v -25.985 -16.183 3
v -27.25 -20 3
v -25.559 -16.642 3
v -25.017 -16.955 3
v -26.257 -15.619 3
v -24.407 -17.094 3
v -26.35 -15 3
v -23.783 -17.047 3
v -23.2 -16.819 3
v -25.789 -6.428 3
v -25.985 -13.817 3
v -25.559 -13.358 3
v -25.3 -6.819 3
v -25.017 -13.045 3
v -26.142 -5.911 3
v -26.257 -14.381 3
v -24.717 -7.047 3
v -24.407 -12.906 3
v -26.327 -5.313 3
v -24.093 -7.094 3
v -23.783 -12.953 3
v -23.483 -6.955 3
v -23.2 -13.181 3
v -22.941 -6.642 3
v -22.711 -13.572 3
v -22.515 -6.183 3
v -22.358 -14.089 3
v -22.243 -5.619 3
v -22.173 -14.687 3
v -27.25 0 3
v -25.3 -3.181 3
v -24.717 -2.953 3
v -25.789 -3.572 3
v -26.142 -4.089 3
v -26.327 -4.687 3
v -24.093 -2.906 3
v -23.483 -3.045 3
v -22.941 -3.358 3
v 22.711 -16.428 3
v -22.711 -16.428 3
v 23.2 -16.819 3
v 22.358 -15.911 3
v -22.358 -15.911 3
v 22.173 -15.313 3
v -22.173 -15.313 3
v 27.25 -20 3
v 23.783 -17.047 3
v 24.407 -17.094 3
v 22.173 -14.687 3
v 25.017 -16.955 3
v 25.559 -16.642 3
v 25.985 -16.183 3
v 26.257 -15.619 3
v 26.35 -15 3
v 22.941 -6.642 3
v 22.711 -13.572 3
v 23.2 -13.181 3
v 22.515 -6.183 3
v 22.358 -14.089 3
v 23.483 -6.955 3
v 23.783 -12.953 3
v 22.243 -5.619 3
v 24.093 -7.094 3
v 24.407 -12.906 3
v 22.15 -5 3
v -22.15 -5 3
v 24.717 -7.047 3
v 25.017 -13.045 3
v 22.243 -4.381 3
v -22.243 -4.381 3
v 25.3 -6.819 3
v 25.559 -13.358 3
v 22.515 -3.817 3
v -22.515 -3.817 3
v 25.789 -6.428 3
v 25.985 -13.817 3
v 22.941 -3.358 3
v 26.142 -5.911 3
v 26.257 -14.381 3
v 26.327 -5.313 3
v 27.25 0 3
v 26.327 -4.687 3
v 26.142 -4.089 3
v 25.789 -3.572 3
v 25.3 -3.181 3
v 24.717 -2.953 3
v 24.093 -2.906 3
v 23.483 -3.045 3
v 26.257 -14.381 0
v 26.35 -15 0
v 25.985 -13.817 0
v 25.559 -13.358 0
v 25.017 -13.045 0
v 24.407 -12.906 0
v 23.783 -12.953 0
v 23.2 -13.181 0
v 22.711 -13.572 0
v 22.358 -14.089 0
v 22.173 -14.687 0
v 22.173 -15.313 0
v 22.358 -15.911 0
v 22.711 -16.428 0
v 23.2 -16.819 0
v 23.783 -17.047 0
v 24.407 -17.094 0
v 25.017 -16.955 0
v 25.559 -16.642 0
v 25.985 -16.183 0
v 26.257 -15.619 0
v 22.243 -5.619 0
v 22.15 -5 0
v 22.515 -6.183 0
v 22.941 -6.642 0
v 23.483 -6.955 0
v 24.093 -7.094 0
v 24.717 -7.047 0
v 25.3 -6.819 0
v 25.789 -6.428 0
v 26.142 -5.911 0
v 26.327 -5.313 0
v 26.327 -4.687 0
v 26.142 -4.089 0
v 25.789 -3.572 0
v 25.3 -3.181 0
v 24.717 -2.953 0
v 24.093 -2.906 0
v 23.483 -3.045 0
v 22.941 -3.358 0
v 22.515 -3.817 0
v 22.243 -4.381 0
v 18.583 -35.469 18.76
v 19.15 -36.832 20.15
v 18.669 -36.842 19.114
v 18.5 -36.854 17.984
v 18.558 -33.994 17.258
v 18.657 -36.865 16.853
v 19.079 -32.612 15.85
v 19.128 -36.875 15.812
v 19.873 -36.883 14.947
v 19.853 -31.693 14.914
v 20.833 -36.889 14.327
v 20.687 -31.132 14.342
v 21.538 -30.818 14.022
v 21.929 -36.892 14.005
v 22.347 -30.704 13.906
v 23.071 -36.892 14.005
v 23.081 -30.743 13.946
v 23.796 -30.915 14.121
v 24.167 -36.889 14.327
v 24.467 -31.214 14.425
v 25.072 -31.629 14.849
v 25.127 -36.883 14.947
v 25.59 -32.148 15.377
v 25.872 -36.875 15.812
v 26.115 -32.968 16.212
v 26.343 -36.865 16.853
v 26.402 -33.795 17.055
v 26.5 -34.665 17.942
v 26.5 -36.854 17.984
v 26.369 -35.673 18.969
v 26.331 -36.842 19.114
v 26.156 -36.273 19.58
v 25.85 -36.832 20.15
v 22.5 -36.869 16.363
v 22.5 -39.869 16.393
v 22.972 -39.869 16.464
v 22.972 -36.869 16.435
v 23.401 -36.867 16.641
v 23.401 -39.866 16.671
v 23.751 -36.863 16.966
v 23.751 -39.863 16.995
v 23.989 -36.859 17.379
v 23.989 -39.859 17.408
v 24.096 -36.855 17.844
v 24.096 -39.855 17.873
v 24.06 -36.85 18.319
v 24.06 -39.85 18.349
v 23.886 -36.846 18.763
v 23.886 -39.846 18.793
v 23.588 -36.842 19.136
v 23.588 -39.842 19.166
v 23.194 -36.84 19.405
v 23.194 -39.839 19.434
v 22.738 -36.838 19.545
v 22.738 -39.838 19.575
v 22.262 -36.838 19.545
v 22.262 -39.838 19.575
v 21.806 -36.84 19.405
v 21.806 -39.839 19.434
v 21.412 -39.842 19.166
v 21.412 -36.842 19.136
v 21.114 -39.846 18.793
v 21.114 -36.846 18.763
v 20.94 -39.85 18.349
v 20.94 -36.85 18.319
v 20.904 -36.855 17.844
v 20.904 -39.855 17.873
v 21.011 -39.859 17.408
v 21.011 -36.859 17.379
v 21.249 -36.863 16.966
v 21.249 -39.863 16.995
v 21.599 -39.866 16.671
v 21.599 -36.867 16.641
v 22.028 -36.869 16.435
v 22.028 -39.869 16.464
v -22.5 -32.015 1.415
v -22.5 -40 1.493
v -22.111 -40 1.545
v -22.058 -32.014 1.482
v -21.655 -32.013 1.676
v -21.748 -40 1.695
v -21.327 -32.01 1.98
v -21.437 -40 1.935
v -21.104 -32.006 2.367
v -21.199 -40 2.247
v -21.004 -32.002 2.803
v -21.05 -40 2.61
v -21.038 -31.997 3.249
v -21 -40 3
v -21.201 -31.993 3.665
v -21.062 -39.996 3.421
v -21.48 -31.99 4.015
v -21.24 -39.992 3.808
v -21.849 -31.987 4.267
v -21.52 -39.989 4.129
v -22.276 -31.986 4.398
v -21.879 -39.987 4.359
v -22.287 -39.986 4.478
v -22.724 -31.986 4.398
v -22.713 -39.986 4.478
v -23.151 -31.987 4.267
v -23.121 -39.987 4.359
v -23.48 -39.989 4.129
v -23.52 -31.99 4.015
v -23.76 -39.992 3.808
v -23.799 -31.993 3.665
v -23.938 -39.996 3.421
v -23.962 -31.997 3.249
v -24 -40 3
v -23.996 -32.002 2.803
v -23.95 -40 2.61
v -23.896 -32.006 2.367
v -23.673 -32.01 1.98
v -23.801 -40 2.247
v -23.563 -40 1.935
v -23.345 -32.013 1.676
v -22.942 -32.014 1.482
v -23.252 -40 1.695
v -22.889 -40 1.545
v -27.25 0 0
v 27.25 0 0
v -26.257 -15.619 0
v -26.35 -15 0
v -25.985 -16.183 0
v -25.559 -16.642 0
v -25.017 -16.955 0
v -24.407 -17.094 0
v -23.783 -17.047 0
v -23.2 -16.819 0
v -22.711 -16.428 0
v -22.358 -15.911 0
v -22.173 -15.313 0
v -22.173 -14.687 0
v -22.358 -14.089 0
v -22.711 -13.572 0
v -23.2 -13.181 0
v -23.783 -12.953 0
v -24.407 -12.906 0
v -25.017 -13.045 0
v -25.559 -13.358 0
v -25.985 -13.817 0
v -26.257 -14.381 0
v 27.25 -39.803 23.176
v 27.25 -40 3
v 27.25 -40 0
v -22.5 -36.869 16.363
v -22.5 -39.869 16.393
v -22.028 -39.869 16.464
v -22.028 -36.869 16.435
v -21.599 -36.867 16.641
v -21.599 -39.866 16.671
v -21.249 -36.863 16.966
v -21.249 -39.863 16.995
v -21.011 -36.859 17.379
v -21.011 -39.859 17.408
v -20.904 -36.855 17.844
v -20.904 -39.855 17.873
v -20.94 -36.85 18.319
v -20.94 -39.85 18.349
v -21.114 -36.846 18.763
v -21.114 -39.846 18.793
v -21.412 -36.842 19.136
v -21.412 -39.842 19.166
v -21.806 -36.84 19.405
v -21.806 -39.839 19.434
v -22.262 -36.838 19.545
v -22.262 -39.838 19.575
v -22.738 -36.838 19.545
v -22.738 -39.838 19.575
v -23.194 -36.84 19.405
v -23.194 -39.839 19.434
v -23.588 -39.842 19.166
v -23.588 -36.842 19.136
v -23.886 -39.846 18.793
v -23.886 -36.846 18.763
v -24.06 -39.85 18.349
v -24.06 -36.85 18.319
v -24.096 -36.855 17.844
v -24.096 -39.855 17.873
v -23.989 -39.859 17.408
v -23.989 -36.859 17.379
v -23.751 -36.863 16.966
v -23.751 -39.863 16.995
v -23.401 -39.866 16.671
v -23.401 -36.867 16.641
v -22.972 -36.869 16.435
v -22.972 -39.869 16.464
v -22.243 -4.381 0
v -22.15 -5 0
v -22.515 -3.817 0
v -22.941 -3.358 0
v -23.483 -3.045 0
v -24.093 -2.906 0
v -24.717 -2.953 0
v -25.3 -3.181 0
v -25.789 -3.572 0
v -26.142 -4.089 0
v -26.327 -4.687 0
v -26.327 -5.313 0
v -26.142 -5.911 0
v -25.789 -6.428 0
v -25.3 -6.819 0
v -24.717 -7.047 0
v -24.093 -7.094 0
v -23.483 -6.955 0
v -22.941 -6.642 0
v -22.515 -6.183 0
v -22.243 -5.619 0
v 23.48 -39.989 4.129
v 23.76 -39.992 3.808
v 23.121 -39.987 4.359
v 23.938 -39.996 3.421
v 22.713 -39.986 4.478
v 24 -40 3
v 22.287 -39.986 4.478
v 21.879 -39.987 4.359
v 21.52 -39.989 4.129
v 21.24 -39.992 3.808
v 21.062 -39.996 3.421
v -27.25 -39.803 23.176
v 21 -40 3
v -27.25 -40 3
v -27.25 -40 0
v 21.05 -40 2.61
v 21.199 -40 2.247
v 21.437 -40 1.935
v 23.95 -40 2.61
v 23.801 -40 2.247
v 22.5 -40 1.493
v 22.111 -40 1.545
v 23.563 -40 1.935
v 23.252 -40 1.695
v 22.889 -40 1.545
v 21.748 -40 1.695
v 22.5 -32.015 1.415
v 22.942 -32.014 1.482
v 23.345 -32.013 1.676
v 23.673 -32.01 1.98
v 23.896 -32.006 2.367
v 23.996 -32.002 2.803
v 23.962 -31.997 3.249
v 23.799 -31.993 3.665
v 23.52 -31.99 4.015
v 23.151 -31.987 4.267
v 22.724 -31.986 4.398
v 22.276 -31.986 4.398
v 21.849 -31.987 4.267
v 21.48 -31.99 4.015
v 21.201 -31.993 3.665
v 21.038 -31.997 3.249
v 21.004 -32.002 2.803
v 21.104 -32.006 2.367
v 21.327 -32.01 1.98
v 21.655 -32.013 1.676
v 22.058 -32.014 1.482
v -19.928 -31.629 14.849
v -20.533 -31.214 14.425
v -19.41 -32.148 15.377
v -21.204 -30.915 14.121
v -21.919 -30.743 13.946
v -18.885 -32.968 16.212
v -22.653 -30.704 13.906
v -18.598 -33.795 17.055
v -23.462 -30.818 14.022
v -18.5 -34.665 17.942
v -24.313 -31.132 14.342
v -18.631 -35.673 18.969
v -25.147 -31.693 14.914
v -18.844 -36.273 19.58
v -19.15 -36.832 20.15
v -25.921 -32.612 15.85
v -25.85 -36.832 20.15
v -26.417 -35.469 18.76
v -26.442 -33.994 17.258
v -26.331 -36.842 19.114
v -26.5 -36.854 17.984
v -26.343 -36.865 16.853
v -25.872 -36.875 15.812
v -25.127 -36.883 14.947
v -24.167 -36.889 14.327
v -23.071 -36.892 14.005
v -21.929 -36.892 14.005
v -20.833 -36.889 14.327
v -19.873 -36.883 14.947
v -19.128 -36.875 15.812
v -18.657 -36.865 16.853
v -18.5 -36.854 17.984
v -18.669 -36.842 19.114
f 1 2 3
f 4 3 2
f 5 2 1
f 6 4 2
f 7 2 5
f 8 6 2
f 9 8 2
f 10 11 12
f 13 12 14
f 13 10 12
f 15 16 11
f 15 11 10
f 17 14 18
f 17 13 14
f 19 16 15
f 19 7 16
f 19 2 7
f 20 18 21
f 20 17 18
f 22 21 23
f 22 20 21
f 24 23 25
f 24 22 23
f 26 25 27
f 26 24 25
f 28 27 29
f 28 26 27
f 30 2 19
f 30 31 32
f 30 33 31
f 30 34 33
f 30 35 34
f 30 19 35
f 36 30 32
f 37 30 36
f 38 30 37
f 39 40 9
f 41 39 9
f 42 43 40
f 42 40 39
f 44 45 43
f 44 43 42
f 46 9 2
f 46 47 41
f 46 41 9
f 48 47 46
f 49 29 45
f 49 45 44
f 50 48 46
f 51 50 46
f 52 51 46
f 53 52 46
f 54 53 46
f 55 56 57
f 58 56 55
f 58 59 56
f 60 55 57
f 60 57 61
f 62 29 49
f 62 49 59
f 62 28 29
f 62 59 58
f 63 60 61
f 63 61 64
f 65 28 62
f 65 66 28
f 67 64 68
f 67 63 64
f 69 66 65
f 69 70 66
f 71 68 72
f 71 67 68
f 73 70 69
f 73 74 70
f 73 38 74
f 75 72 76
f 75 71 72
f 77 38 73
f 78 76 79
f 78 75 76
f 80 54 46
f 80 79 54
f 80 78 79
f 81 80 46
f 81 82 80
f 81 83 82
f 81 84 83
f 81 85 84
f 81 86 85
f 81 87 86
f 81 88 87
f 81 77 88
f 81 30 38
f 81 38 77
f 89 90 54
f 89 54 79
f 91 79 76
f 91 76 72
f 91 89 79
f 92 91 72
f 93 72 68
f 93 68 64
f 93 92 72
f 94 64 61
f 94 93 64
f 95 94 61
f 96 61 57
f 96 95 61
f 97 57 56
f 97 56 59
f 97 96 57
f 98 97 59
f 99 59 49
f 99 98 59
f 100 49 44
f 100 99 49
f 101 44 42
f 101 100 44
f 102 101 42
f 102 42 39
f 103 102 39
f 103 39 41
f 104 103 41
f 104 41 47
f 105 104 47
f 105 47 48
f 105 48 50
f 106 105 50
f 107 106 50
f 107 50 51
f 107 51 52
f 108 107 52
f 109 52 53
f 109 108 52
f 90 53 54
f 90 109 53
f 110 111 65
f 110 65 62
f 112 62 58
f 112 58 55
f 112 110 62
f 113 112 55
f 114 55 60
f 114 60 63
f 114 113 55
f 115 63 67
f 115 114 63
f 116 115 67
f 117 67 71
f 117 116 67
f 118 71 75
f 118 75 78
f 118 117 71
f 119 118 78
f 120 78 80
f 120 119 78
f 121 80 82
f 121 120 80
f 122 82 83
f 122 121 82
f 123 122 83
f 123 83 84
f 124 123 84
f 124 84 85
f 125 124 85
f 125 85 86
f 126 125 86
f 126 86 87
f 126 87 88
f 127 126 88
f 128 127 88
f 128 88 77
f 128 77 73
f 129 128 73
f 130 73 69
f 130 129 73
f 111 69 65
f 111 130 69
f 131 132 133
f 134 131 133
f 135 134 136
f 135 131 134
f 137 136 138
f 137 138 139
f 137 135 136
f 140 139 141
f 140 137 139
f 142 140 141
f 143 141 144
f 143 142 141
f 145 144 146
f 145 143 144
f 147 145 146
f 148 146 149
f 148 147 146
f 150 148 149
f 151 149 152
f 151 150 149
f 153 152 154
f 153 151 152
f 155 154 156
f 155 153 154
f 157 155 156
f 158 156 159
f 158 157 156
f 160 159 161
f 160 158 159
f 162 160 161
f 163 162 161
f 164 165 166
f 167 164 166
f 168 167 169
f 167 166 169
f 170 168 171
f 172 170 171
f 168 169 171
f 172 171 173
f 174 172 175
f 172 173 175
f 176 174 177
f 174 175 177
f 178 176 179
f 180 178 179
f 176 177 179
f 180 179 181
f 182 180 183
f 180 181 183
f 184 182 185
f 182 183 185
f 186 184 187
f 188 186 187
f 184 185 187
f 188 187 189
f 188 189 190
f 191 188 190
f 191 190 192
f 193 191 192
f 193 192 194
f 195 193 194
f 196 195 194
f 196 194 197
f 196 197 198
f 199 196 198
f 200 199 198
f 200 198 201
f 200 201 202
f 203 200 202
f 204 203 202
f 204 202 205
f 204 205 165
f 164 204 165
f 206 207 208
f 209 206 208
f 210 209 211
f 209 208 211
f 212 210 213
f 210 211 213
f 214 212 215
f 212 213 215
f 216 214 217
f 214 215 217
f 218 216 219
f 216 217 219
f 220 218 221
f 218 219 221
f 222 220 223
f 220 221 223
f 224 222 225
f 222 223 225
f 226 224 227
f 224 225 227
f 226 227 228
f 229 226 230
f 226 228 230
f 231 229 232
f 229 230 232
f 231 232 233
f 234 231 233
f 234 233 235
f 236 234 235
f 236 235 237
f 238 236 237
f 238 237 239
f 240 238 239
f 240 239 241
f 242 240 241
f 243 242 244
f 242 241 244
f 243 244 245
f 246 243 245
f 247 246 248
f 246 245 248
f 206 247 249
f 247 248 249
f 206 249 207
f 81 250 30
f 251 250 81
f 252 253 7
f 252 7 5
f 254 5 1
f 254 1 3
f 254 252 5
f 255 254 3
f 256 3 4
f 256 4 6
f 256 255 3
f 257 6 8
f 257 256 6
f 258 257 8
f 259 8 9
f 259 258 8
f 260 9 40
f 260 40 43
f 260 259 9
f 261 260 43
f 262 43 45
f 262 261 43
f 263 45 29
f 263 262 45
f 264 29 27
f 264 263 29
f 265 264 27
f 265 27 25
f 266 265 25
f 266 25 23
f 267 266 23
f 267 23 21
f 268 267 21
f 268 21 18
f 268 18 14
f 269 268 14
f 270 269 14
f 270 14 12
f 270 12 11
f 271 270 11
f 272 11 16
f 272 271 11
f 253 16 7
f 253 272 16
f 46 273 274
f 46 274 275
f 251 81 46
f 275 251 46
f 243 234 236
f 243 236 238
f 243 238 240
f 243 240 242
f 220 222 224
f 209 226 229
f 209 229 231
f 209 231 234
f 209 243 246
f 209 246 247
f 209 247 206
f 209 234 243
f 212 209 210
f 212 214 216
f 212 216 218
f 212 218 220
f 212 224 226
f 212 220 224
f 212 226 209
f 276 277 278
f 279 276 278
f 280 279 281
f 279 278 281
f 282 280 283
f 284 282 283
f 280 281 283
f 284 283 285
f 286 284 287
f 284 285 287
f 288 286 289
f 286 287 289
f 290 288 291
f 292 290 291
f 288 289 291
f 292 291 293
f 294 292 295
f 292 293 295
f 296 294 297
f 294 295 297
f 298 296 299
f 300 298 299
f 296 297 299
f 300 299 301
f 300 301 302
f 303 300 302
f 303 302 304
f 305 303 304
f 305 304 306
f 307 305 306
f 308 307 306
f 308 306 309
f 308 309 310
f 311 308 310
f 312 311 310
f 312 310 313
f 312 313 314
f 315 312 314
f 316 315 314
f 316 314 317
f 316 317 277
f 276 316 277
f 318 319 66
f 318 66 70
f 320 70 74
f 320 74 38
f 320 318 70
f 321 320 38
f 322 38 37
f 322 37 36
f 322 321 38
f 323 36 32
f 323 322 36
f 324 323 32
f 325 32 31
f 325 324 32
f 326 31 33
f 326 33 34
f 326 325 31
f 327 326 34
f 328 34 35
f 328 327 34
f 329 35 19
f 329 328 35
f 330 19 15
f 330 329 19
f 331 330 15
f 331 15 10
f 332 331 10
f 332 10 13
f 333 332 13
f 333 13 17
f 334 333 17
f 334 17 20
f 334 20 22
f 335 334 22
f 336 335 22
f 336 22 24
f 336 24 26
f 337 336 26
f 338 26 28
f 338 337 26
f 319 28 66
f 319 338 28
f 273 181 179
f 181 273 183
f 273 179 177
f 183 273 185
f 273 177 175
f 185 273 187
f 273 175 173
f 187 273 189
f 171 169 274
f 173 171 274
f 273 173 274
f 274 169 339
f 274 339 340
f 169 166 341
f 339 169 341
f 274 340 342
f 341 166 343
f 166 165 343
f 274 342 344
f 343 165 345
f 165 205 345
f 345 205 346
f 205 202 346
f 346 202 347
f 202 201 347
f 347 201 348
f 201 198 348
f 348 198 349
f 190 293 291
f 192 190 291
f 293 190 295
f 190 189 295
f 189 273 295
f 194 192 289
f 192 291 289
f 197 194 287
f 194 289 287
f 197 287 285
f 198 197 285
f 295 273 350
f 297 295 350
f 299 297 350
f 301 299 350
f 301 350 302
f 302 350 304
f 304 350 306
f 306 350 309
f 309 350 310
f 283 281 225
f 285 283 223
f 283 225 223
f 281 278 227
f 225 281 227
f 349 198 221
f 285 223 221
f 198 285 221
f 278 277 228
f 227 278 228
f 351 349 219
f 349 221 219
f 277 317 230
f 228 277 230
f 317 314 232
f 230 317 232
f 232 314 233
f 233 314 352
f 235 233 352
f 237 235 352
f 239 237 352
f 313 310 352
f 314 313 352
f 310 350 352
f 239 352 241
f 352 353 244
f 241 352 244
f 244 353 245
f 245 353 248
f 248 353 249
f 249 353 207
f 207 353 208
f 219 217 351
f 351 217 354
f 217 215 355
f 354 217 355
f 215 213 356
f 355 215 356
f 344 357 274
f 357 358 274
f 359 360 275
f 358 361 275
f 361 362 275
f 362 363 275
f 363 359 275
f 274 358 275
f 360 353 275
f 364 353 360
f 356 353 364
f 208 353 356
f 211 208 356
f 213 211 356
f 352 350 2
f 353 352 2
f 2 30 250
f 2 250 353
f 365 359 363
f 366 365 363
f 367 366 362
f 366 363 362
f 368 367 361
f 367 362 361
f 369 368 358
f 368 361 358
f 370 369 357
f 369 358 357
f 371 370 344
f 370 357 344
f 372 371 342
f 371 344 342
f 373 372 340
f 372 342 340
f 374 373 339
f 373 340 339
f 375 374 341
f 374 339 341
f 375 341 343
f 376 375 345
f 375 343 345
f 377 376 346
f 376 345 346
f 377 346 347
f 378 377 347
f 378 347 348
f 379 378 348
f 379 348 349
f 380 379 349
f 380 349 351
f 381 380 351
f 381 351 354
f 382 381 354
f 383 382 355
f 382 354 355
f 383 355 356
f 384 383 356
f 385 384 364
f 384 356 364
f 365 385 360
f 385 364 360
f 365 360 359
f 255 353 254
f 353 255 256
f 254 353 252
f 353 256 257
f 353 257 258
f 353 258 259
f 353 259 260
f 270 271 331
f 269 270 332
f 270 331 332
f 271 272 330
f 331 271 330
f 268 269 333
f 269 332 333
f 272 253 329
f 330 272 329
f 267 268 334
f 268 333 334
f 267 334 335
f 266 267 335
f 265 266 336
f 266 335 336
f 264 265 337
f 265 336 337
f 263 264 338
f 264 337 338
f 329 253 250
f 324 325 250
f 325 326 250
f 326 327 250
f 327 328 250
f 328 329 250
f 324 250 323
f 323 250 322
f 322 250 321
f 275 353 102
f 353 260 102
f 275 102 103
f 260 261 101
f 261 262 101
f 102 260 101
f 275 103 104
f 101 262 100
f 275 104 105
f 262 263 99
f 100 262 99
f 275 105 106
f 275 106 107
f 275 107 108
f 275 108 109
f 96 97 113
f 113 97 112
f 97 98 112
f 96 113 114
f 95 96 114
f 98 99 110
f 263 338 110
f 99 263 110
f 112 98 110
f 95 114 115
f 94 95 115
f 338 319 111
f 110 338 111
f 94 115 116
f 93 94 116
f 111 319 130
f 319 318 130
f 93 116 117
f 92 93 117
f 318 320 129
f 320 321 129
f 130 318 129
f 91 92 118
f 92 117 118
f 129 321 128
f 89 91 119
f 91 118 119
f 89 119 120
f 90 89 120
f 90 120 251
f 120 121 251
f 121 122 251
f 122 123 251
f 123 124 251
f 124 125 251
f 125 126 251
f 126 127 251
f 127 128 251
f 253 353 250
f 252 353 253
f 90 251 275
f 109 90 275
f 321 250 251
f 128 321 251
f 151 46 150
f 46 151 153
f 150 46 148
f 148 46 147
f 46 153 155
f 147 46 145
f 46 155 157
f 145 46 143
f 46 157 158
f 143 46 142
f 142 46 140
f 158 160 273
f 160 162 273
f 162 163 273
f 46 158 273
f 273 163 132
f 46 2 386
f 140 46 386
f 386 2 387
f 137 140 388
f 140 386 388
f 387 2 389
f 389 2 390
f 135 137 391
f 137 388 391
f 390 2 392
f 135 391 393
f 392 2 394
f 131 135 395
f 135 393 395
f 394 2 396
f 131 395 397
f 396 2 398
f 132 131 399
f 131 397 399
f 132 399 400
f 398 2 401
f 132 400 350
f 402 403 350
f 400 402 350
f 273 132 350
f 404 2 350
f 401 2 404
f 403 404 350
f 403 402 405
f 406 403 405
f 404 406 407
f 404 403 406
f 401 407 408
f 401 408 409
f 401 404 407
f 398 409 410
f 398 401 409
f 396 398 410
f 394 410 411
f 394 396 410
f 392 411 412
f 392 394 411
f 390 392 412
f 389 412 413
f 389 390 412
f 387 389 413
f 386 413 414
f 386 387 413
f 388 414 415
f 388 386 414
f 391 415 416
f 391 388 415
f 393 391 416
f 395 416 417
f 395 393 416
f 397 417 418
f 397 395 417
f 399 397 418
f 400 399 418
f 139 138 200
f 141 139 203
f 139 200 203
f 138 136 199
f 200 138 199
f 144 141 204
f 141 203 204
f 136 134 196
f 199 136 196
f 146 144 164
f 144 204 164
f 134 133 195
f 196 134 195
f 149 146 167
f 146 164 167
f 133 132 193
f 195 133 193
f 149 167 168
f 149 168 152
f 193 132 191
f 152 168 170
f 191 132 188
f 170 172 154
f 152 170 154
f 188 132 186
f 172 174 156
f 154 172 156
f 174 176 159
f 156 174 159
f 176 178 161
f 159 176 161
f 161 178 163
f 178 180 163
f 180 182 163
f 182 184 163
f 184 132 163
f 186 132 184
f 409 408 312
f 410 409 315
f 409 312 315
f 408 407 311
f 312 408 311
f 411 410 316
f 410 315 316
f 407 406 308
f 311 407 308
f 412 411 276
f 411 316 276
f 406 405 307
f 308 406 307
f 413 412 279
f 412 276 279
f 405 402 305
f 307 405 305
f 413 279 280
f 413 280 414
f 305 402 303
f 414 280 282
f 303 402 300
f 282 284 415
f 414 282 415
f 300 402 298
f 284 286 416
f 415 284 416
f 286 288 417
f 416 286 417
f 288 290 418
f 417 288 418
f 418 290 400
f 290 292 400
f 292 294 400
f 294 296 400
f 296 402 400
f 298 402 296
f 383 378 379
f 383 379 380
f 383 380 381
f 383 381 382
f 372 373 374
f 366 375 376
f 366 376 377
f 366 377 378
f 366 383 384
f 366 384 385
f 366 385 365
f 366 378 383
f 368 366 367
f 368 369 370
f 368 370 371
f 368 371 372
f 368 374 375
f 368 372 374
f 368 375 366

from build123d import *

# Parameters (mm, degrees)
SKETCH_1_W          = 54.5
SKETCH_1_H          = 40
SKETCH_1_R          = 2.1
EXTRUDE_1_DEPTH     = 3
EXTRUDE_2_DEPTH     = 54.5
SKETCH_3_R          = 1.5
SKETCH_3_R_2        = 1.6
CUT_EXTRUDE_1_DEPTH = 8
CUT_EXTRUDE_START   = -10
SKETCH_4_R          = 4
CUT_EXTRUDE_2_DEPTH = 7


with BuildPart() as part:
    # 草图1 → 凸台-拉伸1 (new body)
    with BuildSketch(Plane.XY):
        with Locations((0, -20)):
            Rectangle(SKETCH_1_W, SKETCH_1_H)
        with Locations((-24.25, -5)):
            Circle(SKETCH_1_R, mode=Mode.SUBTRACT)
        with Locations(Location((24.25, -5, 0), (0, 0, 180))):
            Circle(SKETCH_1_R, mode=Mode.SUBTRACT)
        with Locations((24.25, -15)):
            Circle(SKETCH_1_R, mode=Mode.SUBTRACT)
        with Locations(Location((-24.25, -15, 0), (0, 0, 180))):
            Circle(SKETCH_1_R, mode=Mode.SUBTRACT)
    extrude(amount=EXTRUDE_1_DEPTH)

    # 草图2 → 凸台-拉伸2 (add)
    with BuildSketch(Plane.ZY.offset(27.25)):
        Polygon((3, -20), (23.176339002, -39.802940776), (3, -40), align=None)
    extrude(amount=-EXTRUDE_2_DEPTH)

    # 草图3 → 切除-拉伸1 (cut)
    with BuildSketch(Plane(origin=(0, -40.025482459, 0.390922779), x_dir=(1, 0, 0), z_dir=(0, -0.9999523077580083, 0.009766381593687423))):
        with Locations(Location((-22.5, 2.602610467, 0), (0, 0, 270))):
            Circle(SKETCH_3_R)
        with Locations(Location((-22.5, 17.602610467, 0), (0, 0, 270))):
            Circle(SKETCH_3_R_2)
        with Locations(Location((22.5, 17.602610467, 0), (0, 0, 270))):
            Circle(SKETCH_3_R_2)
        with Locations(Location((22.5, 2.602610467, 0), (0, 0, 270))):
            Circle(SKETCH_3_R)
    extrude(amount=-CUT_EXTRUDE_1_DEPTH, mode=Mode.SUBTRACT)

    # 草图4 → 切除-拉伸2 (cut)
    with BuildSketch(Plane(origin=(0, -40.025482459, 0.390922779), x_dir=(1, 0, 0), z_dir=(0, -0.9999523077580083, 0.009766381593687423)).offset(CUT_EXTRUDE_START)):
        with Locations((-22.5, 17.602610467)):
            Circle(SKETCH_4_R)
        with Locations((22.5, 17.602610467)):
            Circle(SKETCH_4_R)
    extrude(amount=CUT_EXTRUDE_2_DEPTH, mode=Mode.SUBTRACT)


solid = part.part
